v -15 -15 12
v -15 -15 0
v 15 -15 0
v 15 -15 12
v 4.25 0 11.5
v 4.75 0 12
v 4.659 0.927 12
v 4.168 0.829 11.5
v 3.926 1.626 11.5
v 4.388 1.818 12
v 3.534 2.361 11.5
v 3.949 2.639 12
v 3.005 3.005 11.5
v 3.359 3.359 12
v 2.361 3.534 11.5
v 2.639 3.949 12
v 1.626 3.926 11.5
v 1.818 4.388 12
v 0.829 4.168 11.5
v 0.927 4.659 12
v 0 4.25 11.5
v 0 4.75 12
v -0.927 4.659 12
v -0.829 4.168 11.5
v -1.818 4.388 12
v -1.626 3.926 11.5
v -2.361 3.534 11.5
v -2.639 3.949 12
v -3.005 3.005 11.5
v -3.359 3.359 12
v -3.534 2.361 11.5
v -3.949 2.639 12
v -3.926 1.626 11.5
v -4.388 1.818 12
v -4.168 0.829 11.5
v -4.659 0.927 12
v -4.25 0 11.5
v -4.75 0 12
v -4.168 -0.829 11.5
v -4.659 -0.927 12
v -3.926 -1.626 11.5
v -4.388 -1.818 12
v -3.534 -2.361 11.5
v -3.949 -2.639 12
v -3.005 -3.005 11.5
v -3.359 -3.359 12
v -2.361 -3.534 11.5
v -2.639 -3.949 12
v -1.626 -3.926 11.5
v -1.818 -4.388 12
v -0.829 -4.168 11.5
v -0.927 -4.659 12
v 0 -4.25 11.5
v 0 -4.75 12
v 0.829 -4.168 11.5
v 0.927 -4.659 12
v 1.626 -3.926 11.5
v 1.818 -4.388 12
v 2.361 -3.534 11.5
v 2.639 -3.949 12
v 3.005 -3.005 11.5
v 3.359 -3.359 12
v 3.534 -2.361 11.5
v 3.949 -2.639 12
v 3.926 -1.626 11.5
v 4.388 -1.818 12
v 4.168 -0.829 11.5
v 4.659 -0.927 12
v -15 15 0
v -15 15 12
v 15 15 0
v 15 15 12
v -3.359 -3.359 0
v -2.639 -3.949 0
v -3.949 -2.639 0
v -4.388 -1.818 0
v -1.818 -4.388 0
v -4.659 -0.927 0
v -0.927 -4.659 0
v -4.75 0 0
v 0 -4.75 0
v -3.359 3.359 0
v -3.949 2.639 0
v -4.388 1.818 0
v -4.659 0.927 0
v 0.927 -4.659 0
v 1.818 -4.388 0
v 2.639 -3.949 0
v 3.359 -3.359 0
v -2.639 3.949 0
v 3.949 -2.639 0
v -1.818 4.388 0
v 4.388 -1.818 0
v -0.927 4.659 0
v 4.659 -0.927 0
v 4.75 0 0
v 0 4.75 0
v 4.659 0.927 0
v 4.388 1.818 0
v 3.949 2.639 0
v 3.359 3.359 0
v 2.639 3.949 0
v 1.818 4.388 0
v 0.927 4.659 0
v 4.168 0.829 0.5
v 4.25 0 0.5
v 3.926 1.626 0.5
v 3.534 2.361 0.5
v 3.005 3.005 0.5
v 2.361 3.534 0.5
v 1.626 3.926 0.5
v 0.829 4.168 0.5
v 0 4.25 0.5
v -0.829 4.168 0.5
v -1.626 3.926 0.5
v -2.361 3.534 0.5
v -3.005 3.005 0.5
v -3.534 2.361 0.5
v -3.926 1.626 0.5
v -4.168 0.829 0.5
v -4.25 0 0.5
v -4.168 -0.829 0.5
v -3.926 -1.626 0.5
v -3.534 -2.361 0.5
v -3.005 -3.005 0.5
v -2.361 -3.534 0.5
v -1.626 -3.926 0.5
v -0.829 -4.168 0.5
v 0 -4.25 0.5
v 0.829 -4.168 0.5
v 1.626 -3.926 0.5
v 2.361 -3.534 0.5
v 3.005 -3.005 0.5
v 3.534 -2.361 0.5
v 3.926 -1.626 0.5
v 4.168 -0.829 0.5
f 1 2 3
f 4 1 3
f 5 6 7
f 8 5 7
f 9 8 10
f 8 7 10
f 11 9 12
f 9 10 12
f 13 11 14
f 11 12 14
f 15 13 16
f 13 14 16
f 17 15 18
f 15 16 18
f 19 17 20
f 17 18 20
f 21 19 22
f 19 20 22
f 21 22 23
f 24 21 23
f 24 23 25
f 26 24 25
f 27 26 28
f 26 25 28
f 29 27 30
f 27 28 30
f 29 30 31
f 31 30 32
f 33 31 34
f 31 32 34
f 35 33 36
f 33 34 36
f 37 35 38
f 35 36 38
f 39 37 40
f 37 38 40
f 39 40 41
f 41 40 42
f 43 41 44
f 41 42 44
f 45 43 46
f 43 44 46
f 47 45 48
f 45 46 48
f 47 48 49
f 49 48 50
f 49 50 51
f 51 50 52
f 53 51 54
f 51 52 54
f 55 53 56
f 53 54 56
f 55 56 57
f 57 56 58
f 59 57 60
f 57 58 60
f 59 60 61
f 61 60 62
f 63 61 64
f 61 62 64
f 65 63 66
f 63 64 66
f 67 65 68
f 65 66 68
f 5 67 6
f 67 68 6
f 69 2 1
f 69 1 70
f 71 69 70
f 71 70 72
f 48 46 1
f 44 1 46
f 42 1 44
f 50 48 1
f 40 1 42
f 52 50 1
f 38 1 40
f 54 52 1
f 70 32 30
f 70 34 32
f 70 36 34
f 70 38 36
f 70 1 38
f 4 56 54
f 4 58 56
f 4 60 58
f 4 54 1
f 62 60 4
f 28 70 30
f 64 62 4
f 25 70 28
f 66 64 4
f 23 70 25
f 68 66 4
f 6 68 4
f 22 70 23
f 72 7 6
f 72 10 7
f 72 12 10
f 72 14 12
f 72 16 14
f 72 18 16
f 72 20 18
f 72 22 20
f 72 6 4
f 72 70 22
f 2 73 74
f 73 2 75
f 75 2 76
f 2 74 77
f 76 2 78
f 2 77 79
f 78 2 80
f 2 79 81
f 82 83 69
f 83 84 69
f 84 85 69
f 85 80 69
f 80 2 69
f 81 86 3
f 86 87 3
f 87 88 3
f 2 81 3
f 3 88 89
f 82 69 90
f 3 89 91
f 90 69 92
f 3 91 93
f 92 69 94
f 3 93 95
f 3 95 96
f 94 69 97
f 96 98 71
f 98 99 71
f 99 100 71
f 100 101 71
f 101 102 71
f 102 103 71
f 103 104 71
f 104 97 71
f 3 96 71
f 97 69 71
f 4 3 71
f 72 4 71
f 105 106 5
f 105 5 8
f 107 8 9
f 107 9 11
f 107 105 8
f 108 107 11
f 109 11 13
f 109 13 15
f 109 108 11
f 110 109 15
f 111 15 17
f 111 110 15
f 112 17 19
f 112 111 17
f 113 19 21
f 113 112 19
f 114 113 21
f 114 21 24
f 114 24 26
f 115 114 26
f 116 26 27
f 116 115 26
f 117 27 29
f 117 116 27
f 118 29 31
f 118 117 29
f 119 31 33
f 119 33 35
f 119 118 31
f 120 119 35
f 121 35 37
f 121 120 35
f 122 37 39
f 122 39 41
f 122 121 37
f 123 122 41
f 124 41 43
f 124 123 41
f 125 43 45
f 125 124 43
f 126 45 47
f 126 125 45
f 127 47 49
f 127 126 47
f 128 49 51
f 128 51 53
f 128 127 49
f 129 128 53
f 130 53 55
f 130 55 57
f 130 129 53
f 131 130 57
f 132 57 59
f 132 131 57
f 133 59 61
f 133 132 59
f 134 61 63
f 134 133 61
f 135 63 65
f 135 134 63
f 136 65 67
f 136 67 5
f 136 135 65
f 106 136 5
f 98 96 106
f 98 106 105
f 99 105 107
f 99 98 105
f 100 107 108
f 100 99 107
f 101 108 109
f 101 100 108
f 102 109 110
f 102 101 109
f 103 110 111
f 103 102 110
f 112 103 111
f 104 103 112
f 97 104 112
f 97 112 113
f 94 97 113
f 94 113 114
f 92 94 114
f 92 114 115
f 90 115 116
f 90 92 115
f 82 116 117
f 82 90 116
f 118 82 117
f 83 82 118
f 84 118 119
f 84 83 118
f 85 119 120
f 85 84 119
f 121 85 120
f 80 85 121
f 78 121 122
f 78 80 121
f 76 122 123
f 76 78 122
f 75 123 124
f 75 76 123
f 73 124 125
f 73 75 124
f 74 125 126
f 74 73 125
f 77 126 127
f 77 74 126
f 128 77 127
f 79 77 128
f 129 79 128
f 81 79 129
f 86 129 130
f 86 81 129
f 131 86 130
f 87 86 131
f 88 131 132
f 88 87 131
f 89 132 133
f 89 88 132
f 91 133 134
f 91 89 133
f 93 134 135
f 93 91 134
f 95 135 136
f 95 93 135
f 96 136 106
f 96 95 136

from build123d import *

# Parameters (mm, degrees)
F0_W     = 30
F0_H     = 30
F0_R     = 4.25
F1_DEPTH = 12
F2_SIZE  = 0.5


with BuildPart() as f1:
    # F0 (on Top) → F1 (new body)
    with BuildSketch(Plane.XY):
        Rectangle(F0_W, F0_H)
        Circle(F0_R, mode=Mode.SUBTRACT)
    extrude(amount=F1_DEPTH)

    # F2
    f2_edges = [f1.edges().sort_by_distance(p)[0] for p in [
        (4.25, 0, 6),
        (-4.25, 0, 0),
        (-4.25, 0, 12),
    ]]
    chamfer(f2_edges, length=F2_SIZE)


solid = f1.part
